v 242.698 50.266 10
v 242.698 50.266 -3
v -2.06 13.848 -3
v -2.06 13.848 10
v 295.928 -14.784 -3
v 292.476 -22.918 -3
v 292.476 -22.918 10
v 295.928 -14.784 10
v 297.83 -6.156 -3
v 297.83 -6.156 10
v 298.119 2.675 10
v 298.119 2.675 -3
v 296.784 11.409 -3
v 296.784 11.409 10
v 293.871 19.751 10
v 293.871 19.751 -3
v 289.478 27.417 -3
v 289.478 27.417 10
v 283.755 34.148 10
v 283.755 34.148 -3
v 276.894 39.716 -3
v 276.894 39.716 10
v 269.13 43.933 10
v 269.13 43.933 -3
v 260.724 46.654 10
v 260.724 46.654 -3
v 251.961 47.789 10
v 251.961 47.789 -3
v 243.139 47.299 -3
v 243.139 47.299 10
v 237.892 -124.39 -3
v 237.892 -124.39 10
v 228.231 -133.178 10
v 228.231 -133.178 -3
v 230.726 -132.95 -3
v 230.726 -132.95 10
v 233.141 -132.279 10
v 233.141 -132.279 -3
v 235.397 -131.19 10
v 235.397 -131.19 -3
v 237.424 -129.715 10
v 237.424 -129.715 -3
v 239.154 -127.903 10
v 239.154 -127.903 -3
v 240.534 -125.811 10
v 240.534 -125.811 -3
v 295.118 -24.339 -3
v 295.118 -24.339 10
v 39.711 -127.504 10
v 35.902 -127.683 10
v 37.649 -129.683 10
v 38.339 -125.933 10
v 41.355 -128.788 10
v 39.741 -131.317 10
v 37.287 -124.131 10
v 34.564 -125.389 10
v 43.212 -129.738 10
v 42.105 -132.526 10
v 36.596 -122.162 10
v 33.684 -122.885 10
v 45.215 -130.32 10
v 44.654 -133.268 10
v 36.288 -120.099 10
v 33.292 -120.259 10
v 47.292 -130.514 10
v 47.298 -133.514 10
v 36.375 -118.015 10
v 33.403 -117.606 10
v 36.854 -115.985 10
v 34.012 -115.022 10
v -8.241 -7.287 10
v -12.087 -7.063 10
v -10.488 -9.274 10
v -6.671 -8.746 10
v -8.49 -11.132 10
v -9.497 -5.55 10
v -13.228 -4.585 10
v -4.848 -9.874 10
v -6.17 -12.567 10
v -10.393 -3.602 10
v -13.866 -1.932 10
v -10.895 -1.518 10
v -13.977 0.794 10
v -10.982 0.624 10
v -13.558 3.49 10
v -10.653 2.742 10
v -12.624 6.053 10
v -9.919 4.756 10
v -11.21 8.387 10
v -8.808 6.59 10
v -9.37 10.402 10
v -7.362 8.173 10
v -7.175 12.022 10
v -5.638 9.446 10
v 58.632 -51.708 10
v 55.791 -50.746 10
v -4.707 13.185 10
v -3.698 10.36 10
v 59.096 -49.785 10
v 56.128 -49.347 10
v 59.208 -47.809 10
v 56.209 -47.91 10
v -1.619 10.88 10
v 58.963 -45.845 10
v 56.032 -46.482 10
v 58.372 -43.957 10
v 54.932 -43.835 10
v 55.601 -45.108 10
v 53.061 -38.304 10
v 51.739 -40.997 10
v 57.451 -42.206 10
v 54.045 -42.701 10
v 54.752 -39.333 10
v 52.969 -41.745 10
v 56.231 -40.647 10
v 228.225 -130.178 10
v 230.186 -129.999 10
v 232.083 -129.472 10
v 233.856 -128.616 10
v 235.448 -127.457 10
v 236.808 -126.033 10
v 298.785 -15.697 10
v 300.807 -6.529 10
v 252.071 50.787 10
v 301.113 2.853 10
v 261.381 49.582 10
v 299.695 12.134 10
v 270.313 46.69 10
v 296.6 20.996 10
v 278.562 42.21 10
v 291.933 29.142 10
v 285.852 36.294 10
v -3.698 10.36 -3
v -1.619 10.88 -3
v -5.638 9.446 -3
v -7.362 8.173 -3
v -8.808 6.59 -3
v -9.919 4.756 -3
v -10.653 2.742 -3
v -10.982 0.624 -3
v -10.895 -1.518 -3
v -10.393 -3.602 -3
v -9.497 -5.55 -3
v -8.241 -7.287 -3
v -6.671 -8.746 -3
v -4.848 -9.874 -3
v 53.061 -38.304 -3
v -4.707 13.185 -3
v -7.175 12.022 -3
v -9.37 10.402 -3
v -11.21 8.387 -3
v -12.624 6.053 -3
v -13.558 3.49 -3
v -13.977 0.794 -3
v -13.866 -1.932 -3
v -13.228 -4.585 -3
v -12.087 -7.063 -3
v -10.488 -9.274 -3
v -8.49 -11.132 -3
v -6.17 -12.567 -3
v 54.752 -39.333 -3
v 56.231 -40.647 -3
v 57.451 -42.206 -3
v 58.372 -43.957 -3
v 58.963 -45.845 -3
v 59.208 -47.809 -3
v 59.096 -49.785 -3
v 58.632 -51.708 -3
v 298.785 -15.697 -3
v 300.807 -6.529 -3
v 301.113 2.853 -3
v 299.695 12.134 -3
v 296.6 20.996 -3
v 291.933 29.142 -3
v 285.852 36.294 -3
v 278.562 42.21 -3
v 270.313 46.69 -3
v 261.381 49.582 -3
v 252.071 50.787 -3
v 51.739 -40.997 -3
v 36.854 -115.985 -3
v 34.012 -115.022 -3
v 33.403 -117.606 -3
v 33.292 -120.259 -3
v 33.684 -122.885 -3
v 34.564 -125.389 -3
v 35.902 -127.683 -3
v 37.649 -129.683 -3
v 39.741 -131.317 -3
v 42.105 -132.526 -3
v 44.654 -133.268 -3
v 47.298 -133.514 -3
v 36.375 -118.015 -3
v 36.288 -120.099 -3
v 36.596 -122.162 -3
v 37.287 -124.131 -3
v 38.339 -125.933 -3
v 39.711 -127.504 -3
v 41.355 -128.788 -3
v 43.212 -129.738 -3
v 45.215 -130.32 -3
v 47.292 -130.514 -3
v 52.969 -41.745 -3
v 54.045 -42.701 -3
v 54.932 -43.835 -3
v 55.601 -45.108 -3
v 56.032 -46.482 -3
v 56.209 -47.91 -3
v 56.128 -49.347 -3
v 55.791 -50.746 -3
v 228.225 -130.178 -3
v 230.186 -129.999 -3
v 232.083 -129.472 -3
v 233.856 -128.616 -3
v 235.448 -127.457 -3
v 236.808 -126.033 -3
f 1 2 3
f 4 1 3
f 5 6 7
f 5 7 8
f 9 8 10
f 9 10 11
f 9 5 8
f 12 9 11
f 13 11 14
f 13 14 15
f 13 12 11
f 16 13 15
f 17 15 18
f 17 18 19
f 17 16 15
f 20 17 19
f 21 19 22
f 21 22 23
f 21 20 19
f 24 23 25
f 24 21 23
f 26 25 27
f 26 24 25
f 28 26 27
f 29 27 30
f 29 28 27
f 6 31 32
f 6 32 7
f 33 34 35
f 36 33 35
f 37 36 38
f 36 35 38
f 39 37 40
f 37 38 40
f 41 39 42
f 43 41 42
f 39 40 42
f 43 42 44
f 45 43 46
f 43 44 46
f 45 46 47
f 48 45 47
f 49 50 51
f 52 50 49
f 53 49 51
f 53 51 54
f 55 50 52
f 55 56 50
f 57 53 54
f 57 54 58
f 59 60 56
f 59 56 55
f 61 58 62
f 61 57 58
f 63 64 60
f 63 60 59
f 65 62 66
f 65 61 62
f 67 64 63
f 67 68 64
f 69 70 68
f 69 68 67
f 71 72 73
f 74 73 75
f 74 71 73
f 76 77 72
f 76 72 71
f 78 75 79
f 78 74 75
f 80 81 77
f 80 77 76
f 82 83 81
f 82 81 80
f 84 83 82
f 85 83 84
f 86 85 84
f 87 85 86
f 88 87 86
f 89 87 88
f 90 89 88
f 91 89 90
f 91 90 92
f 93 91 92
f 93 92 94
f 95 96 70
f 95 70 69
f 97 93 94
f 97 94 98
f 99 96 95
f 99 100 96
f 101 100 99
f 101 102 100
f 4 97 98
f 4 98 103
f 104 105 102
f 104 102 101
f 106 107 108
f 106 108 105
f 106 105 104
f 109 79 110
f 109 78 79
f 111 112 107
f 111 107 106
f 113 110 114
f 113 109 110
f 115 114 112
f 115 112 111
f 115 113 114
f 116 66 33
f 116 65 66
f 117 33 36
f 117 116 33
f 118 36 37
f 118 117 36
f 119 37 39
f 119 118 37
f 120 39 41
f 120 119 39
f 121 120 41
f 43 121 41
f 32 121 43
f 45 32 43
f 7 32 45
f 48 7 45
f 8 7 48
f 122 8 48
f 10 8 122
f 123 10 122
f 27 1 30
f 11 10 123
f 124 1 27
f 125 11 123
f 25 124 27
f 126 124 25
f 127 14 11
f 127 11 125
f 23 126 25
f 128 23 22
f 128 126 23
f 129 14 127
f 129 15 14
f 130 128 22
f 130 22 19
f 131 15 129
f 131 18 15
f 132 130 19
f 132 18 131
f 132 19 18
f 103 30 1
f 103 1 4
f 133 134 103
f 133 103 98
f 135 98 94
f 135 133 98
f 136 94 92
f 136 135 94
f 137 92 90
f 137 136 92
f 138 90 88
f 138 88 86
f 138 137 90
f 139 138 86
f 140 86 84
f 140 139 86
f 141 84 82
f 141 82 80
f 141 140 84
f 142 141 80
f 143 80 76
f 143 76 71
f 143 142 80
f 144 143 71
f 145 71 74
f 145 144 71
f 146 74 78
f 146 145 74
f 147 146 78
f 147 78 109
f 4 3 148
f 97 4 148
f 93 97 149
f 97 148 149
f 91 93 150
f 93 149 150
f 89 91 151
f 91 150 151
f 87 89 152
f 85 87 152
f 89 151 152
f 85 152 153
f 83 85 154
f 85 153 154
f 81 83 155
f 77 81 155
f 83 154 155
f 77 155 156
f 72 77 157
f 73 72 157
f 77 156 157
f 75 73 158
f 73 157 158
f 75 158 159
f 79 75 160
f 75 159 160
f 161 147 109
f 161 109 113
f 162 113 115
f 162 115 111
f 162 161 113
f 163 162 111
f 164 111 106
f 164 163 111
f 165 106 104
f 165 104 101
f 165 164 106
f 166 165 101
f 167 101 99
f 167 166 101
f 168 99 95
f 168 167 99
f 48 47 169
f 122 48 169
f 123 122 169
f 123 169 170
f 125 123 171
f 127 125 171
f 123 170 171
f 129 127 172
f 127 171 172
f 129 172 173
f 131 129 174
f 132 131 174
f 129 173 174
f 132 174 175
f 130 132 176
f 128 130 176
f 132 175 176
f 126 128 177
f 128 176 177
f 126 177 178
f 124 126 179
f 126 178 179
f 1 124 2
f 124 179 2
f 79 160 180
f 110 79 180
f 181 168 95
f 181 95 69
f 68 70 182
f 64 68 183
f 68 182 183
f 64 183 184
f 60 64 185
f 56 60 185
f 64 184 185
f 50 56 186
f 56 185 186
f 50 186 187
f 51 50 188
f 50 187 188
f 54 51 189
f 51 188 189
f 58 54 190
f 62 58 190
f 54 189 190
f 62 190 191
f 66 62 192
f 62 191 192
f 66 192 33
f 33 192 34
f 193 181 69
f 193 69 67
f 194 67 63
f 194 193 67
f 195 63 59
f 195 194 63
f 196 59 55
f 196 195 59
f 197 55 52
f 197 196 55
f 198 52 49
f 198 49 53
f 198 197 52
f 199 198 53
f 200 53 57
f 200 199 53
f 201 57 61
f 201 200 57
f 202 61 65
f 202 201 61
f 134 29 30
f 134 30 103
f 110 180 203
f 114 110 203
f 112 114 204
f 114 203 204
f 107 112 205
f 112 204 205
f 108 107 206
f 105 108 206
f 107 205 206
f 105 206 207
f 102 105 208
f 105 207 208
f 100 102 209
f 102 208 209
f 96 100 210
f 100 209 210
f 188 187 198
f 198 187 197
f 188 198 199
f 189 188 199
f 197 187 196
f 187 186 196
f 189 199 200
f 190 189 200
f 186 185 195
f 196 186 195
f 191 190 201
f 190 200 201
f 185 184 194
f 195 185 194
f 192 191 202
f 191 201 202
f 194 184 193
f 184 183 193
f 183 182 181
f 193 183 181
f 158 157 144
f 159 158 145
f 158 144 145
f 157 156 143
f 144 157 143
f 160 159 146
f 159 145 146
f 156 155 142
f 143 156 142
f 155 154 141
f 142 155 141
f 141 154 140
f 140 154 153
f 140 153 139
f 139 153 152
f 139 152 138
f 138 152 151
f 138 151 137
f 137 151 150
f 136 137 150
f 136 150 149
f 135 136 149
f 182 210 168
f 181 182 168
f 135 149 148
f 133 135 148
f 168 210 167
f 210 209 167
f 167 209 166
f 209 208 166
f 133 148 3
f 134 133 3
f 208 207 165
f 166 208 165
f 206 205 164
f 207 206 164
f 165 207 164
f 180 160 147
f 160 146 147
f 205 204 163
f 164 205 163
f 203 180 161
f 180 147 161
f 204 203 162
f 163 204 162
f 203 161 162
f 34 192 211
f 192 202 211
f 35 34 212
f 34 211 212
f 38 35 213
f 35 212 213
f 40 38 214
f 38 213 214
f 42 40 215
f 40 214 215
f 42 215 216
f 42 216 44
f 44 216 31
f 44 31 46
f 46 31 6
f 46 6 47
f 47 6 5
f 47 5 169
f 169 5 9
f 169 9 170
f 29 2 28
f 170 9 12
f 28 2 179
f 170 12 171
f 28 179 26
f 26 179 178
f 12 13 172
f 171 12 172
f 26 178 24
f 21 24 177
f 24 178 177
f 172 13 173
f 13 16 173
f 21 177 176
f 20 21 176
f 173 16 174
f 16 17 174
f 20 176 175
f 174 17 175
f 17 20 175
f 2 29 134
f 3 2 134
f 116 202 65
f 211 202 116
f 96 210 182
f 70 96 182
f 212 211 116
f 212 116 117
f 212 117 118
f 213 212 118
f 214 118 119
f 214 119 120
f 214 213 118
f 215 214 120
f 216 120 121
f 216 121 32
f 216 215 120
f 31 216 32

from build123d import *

# Parameters (mm, degrees)
EXTRUDE_THIN1_DEPTH      = 10
EXTRUDE_THIN1_DEPTH_BACK = 3


with BuildPart() as part:
    # Sketch2 → Extrude-Thin1 (new, two sides: drawn at the far end of the back side and taken through both)
    with BuildSketch(Plane.XY.offset(-EXTRUDE_THIN1_DEPTH_BACK)):
        with BuildLine():
            Line((242.697793623, 50.266129876), (-2.060433635, 13.847548997))
            ThreePointArc((-2.060433635, 13.847548997), (-13.833600307, 2.152092613), (-6.16977134, -12.56717636))
            Line((-6.16977134, -12.56717636), (51.739342618, -40.997269268))
            ThreePointArc((51.739342618, -40.997269268), (55.601208684, -45.108400995), (55.790656513, -50.745733973))
            Line((55.790656513, -50.745733973), (34.012493217, -115.021815701))
            ThreePointArc((34.012493217, -115.021815701), (35.902100375, -127.682924287), (47.298057776, -133.514428444))
            Line((47.298057776, -133.514428444), (228.230752902, -133.17848877))
            ThreePointArc((228.230752902, -133.17848877), (235.397453639, -131.189555479), (240.534146402, -125.810722655))
            Line((240.534146402, -125.810722655), (295.117855974, -24.338705573))
            ThreePointArc((295.117855974, -24.338705573), (291.932739821, 29.141852266), (242.697793623, 50.266129876))
        make_face()
        with BuildLine():
            Line((243.139315115, 47.298797948), (-1.618912142, 10.880217069))
            ThreePointArc((-1.618912142, 10.880217069), (-10.869257385, 1.69092991), (-4.847677482, -9.874209997))
            Line((-4.847677482, -9.874209997), (53.061436476, -38.304302905))
            ThreePointArc((53.061436476, -38.304302905), (58.371502316, -43.95710903), (58.631993081, -51.708441875))
            Line((58.631993081, -51.708441875), (36.853829786, -115.984523603))
            ThreePointArc((36.853829786, -115.984523603), (38.338521124, -125.932537492), (47.292487653, -130.514433615))
            Line((47.292487653, -130.514433615), (228.225182779, -130.178493941))
            ThreePointArc((228.225182779, -130.178493941), (233.85616193, -128.615760641), (237.892134815, -124.389534851))
            Line((237.892134815, -124.389534851), (292.475844387, -22.917517769))
            ThreePointArc((292.475844387, -22.917517769), (289.478088008, 27.417124903), (243.139315115, 47.298797948))
        make_face(mode=Mode.SUBTRACT)
    extrude(amount=EXTRUDE_THIN1_DEPTH + EXTRUDE_THIN1_DEPTH_BACK)


solid = part.part
